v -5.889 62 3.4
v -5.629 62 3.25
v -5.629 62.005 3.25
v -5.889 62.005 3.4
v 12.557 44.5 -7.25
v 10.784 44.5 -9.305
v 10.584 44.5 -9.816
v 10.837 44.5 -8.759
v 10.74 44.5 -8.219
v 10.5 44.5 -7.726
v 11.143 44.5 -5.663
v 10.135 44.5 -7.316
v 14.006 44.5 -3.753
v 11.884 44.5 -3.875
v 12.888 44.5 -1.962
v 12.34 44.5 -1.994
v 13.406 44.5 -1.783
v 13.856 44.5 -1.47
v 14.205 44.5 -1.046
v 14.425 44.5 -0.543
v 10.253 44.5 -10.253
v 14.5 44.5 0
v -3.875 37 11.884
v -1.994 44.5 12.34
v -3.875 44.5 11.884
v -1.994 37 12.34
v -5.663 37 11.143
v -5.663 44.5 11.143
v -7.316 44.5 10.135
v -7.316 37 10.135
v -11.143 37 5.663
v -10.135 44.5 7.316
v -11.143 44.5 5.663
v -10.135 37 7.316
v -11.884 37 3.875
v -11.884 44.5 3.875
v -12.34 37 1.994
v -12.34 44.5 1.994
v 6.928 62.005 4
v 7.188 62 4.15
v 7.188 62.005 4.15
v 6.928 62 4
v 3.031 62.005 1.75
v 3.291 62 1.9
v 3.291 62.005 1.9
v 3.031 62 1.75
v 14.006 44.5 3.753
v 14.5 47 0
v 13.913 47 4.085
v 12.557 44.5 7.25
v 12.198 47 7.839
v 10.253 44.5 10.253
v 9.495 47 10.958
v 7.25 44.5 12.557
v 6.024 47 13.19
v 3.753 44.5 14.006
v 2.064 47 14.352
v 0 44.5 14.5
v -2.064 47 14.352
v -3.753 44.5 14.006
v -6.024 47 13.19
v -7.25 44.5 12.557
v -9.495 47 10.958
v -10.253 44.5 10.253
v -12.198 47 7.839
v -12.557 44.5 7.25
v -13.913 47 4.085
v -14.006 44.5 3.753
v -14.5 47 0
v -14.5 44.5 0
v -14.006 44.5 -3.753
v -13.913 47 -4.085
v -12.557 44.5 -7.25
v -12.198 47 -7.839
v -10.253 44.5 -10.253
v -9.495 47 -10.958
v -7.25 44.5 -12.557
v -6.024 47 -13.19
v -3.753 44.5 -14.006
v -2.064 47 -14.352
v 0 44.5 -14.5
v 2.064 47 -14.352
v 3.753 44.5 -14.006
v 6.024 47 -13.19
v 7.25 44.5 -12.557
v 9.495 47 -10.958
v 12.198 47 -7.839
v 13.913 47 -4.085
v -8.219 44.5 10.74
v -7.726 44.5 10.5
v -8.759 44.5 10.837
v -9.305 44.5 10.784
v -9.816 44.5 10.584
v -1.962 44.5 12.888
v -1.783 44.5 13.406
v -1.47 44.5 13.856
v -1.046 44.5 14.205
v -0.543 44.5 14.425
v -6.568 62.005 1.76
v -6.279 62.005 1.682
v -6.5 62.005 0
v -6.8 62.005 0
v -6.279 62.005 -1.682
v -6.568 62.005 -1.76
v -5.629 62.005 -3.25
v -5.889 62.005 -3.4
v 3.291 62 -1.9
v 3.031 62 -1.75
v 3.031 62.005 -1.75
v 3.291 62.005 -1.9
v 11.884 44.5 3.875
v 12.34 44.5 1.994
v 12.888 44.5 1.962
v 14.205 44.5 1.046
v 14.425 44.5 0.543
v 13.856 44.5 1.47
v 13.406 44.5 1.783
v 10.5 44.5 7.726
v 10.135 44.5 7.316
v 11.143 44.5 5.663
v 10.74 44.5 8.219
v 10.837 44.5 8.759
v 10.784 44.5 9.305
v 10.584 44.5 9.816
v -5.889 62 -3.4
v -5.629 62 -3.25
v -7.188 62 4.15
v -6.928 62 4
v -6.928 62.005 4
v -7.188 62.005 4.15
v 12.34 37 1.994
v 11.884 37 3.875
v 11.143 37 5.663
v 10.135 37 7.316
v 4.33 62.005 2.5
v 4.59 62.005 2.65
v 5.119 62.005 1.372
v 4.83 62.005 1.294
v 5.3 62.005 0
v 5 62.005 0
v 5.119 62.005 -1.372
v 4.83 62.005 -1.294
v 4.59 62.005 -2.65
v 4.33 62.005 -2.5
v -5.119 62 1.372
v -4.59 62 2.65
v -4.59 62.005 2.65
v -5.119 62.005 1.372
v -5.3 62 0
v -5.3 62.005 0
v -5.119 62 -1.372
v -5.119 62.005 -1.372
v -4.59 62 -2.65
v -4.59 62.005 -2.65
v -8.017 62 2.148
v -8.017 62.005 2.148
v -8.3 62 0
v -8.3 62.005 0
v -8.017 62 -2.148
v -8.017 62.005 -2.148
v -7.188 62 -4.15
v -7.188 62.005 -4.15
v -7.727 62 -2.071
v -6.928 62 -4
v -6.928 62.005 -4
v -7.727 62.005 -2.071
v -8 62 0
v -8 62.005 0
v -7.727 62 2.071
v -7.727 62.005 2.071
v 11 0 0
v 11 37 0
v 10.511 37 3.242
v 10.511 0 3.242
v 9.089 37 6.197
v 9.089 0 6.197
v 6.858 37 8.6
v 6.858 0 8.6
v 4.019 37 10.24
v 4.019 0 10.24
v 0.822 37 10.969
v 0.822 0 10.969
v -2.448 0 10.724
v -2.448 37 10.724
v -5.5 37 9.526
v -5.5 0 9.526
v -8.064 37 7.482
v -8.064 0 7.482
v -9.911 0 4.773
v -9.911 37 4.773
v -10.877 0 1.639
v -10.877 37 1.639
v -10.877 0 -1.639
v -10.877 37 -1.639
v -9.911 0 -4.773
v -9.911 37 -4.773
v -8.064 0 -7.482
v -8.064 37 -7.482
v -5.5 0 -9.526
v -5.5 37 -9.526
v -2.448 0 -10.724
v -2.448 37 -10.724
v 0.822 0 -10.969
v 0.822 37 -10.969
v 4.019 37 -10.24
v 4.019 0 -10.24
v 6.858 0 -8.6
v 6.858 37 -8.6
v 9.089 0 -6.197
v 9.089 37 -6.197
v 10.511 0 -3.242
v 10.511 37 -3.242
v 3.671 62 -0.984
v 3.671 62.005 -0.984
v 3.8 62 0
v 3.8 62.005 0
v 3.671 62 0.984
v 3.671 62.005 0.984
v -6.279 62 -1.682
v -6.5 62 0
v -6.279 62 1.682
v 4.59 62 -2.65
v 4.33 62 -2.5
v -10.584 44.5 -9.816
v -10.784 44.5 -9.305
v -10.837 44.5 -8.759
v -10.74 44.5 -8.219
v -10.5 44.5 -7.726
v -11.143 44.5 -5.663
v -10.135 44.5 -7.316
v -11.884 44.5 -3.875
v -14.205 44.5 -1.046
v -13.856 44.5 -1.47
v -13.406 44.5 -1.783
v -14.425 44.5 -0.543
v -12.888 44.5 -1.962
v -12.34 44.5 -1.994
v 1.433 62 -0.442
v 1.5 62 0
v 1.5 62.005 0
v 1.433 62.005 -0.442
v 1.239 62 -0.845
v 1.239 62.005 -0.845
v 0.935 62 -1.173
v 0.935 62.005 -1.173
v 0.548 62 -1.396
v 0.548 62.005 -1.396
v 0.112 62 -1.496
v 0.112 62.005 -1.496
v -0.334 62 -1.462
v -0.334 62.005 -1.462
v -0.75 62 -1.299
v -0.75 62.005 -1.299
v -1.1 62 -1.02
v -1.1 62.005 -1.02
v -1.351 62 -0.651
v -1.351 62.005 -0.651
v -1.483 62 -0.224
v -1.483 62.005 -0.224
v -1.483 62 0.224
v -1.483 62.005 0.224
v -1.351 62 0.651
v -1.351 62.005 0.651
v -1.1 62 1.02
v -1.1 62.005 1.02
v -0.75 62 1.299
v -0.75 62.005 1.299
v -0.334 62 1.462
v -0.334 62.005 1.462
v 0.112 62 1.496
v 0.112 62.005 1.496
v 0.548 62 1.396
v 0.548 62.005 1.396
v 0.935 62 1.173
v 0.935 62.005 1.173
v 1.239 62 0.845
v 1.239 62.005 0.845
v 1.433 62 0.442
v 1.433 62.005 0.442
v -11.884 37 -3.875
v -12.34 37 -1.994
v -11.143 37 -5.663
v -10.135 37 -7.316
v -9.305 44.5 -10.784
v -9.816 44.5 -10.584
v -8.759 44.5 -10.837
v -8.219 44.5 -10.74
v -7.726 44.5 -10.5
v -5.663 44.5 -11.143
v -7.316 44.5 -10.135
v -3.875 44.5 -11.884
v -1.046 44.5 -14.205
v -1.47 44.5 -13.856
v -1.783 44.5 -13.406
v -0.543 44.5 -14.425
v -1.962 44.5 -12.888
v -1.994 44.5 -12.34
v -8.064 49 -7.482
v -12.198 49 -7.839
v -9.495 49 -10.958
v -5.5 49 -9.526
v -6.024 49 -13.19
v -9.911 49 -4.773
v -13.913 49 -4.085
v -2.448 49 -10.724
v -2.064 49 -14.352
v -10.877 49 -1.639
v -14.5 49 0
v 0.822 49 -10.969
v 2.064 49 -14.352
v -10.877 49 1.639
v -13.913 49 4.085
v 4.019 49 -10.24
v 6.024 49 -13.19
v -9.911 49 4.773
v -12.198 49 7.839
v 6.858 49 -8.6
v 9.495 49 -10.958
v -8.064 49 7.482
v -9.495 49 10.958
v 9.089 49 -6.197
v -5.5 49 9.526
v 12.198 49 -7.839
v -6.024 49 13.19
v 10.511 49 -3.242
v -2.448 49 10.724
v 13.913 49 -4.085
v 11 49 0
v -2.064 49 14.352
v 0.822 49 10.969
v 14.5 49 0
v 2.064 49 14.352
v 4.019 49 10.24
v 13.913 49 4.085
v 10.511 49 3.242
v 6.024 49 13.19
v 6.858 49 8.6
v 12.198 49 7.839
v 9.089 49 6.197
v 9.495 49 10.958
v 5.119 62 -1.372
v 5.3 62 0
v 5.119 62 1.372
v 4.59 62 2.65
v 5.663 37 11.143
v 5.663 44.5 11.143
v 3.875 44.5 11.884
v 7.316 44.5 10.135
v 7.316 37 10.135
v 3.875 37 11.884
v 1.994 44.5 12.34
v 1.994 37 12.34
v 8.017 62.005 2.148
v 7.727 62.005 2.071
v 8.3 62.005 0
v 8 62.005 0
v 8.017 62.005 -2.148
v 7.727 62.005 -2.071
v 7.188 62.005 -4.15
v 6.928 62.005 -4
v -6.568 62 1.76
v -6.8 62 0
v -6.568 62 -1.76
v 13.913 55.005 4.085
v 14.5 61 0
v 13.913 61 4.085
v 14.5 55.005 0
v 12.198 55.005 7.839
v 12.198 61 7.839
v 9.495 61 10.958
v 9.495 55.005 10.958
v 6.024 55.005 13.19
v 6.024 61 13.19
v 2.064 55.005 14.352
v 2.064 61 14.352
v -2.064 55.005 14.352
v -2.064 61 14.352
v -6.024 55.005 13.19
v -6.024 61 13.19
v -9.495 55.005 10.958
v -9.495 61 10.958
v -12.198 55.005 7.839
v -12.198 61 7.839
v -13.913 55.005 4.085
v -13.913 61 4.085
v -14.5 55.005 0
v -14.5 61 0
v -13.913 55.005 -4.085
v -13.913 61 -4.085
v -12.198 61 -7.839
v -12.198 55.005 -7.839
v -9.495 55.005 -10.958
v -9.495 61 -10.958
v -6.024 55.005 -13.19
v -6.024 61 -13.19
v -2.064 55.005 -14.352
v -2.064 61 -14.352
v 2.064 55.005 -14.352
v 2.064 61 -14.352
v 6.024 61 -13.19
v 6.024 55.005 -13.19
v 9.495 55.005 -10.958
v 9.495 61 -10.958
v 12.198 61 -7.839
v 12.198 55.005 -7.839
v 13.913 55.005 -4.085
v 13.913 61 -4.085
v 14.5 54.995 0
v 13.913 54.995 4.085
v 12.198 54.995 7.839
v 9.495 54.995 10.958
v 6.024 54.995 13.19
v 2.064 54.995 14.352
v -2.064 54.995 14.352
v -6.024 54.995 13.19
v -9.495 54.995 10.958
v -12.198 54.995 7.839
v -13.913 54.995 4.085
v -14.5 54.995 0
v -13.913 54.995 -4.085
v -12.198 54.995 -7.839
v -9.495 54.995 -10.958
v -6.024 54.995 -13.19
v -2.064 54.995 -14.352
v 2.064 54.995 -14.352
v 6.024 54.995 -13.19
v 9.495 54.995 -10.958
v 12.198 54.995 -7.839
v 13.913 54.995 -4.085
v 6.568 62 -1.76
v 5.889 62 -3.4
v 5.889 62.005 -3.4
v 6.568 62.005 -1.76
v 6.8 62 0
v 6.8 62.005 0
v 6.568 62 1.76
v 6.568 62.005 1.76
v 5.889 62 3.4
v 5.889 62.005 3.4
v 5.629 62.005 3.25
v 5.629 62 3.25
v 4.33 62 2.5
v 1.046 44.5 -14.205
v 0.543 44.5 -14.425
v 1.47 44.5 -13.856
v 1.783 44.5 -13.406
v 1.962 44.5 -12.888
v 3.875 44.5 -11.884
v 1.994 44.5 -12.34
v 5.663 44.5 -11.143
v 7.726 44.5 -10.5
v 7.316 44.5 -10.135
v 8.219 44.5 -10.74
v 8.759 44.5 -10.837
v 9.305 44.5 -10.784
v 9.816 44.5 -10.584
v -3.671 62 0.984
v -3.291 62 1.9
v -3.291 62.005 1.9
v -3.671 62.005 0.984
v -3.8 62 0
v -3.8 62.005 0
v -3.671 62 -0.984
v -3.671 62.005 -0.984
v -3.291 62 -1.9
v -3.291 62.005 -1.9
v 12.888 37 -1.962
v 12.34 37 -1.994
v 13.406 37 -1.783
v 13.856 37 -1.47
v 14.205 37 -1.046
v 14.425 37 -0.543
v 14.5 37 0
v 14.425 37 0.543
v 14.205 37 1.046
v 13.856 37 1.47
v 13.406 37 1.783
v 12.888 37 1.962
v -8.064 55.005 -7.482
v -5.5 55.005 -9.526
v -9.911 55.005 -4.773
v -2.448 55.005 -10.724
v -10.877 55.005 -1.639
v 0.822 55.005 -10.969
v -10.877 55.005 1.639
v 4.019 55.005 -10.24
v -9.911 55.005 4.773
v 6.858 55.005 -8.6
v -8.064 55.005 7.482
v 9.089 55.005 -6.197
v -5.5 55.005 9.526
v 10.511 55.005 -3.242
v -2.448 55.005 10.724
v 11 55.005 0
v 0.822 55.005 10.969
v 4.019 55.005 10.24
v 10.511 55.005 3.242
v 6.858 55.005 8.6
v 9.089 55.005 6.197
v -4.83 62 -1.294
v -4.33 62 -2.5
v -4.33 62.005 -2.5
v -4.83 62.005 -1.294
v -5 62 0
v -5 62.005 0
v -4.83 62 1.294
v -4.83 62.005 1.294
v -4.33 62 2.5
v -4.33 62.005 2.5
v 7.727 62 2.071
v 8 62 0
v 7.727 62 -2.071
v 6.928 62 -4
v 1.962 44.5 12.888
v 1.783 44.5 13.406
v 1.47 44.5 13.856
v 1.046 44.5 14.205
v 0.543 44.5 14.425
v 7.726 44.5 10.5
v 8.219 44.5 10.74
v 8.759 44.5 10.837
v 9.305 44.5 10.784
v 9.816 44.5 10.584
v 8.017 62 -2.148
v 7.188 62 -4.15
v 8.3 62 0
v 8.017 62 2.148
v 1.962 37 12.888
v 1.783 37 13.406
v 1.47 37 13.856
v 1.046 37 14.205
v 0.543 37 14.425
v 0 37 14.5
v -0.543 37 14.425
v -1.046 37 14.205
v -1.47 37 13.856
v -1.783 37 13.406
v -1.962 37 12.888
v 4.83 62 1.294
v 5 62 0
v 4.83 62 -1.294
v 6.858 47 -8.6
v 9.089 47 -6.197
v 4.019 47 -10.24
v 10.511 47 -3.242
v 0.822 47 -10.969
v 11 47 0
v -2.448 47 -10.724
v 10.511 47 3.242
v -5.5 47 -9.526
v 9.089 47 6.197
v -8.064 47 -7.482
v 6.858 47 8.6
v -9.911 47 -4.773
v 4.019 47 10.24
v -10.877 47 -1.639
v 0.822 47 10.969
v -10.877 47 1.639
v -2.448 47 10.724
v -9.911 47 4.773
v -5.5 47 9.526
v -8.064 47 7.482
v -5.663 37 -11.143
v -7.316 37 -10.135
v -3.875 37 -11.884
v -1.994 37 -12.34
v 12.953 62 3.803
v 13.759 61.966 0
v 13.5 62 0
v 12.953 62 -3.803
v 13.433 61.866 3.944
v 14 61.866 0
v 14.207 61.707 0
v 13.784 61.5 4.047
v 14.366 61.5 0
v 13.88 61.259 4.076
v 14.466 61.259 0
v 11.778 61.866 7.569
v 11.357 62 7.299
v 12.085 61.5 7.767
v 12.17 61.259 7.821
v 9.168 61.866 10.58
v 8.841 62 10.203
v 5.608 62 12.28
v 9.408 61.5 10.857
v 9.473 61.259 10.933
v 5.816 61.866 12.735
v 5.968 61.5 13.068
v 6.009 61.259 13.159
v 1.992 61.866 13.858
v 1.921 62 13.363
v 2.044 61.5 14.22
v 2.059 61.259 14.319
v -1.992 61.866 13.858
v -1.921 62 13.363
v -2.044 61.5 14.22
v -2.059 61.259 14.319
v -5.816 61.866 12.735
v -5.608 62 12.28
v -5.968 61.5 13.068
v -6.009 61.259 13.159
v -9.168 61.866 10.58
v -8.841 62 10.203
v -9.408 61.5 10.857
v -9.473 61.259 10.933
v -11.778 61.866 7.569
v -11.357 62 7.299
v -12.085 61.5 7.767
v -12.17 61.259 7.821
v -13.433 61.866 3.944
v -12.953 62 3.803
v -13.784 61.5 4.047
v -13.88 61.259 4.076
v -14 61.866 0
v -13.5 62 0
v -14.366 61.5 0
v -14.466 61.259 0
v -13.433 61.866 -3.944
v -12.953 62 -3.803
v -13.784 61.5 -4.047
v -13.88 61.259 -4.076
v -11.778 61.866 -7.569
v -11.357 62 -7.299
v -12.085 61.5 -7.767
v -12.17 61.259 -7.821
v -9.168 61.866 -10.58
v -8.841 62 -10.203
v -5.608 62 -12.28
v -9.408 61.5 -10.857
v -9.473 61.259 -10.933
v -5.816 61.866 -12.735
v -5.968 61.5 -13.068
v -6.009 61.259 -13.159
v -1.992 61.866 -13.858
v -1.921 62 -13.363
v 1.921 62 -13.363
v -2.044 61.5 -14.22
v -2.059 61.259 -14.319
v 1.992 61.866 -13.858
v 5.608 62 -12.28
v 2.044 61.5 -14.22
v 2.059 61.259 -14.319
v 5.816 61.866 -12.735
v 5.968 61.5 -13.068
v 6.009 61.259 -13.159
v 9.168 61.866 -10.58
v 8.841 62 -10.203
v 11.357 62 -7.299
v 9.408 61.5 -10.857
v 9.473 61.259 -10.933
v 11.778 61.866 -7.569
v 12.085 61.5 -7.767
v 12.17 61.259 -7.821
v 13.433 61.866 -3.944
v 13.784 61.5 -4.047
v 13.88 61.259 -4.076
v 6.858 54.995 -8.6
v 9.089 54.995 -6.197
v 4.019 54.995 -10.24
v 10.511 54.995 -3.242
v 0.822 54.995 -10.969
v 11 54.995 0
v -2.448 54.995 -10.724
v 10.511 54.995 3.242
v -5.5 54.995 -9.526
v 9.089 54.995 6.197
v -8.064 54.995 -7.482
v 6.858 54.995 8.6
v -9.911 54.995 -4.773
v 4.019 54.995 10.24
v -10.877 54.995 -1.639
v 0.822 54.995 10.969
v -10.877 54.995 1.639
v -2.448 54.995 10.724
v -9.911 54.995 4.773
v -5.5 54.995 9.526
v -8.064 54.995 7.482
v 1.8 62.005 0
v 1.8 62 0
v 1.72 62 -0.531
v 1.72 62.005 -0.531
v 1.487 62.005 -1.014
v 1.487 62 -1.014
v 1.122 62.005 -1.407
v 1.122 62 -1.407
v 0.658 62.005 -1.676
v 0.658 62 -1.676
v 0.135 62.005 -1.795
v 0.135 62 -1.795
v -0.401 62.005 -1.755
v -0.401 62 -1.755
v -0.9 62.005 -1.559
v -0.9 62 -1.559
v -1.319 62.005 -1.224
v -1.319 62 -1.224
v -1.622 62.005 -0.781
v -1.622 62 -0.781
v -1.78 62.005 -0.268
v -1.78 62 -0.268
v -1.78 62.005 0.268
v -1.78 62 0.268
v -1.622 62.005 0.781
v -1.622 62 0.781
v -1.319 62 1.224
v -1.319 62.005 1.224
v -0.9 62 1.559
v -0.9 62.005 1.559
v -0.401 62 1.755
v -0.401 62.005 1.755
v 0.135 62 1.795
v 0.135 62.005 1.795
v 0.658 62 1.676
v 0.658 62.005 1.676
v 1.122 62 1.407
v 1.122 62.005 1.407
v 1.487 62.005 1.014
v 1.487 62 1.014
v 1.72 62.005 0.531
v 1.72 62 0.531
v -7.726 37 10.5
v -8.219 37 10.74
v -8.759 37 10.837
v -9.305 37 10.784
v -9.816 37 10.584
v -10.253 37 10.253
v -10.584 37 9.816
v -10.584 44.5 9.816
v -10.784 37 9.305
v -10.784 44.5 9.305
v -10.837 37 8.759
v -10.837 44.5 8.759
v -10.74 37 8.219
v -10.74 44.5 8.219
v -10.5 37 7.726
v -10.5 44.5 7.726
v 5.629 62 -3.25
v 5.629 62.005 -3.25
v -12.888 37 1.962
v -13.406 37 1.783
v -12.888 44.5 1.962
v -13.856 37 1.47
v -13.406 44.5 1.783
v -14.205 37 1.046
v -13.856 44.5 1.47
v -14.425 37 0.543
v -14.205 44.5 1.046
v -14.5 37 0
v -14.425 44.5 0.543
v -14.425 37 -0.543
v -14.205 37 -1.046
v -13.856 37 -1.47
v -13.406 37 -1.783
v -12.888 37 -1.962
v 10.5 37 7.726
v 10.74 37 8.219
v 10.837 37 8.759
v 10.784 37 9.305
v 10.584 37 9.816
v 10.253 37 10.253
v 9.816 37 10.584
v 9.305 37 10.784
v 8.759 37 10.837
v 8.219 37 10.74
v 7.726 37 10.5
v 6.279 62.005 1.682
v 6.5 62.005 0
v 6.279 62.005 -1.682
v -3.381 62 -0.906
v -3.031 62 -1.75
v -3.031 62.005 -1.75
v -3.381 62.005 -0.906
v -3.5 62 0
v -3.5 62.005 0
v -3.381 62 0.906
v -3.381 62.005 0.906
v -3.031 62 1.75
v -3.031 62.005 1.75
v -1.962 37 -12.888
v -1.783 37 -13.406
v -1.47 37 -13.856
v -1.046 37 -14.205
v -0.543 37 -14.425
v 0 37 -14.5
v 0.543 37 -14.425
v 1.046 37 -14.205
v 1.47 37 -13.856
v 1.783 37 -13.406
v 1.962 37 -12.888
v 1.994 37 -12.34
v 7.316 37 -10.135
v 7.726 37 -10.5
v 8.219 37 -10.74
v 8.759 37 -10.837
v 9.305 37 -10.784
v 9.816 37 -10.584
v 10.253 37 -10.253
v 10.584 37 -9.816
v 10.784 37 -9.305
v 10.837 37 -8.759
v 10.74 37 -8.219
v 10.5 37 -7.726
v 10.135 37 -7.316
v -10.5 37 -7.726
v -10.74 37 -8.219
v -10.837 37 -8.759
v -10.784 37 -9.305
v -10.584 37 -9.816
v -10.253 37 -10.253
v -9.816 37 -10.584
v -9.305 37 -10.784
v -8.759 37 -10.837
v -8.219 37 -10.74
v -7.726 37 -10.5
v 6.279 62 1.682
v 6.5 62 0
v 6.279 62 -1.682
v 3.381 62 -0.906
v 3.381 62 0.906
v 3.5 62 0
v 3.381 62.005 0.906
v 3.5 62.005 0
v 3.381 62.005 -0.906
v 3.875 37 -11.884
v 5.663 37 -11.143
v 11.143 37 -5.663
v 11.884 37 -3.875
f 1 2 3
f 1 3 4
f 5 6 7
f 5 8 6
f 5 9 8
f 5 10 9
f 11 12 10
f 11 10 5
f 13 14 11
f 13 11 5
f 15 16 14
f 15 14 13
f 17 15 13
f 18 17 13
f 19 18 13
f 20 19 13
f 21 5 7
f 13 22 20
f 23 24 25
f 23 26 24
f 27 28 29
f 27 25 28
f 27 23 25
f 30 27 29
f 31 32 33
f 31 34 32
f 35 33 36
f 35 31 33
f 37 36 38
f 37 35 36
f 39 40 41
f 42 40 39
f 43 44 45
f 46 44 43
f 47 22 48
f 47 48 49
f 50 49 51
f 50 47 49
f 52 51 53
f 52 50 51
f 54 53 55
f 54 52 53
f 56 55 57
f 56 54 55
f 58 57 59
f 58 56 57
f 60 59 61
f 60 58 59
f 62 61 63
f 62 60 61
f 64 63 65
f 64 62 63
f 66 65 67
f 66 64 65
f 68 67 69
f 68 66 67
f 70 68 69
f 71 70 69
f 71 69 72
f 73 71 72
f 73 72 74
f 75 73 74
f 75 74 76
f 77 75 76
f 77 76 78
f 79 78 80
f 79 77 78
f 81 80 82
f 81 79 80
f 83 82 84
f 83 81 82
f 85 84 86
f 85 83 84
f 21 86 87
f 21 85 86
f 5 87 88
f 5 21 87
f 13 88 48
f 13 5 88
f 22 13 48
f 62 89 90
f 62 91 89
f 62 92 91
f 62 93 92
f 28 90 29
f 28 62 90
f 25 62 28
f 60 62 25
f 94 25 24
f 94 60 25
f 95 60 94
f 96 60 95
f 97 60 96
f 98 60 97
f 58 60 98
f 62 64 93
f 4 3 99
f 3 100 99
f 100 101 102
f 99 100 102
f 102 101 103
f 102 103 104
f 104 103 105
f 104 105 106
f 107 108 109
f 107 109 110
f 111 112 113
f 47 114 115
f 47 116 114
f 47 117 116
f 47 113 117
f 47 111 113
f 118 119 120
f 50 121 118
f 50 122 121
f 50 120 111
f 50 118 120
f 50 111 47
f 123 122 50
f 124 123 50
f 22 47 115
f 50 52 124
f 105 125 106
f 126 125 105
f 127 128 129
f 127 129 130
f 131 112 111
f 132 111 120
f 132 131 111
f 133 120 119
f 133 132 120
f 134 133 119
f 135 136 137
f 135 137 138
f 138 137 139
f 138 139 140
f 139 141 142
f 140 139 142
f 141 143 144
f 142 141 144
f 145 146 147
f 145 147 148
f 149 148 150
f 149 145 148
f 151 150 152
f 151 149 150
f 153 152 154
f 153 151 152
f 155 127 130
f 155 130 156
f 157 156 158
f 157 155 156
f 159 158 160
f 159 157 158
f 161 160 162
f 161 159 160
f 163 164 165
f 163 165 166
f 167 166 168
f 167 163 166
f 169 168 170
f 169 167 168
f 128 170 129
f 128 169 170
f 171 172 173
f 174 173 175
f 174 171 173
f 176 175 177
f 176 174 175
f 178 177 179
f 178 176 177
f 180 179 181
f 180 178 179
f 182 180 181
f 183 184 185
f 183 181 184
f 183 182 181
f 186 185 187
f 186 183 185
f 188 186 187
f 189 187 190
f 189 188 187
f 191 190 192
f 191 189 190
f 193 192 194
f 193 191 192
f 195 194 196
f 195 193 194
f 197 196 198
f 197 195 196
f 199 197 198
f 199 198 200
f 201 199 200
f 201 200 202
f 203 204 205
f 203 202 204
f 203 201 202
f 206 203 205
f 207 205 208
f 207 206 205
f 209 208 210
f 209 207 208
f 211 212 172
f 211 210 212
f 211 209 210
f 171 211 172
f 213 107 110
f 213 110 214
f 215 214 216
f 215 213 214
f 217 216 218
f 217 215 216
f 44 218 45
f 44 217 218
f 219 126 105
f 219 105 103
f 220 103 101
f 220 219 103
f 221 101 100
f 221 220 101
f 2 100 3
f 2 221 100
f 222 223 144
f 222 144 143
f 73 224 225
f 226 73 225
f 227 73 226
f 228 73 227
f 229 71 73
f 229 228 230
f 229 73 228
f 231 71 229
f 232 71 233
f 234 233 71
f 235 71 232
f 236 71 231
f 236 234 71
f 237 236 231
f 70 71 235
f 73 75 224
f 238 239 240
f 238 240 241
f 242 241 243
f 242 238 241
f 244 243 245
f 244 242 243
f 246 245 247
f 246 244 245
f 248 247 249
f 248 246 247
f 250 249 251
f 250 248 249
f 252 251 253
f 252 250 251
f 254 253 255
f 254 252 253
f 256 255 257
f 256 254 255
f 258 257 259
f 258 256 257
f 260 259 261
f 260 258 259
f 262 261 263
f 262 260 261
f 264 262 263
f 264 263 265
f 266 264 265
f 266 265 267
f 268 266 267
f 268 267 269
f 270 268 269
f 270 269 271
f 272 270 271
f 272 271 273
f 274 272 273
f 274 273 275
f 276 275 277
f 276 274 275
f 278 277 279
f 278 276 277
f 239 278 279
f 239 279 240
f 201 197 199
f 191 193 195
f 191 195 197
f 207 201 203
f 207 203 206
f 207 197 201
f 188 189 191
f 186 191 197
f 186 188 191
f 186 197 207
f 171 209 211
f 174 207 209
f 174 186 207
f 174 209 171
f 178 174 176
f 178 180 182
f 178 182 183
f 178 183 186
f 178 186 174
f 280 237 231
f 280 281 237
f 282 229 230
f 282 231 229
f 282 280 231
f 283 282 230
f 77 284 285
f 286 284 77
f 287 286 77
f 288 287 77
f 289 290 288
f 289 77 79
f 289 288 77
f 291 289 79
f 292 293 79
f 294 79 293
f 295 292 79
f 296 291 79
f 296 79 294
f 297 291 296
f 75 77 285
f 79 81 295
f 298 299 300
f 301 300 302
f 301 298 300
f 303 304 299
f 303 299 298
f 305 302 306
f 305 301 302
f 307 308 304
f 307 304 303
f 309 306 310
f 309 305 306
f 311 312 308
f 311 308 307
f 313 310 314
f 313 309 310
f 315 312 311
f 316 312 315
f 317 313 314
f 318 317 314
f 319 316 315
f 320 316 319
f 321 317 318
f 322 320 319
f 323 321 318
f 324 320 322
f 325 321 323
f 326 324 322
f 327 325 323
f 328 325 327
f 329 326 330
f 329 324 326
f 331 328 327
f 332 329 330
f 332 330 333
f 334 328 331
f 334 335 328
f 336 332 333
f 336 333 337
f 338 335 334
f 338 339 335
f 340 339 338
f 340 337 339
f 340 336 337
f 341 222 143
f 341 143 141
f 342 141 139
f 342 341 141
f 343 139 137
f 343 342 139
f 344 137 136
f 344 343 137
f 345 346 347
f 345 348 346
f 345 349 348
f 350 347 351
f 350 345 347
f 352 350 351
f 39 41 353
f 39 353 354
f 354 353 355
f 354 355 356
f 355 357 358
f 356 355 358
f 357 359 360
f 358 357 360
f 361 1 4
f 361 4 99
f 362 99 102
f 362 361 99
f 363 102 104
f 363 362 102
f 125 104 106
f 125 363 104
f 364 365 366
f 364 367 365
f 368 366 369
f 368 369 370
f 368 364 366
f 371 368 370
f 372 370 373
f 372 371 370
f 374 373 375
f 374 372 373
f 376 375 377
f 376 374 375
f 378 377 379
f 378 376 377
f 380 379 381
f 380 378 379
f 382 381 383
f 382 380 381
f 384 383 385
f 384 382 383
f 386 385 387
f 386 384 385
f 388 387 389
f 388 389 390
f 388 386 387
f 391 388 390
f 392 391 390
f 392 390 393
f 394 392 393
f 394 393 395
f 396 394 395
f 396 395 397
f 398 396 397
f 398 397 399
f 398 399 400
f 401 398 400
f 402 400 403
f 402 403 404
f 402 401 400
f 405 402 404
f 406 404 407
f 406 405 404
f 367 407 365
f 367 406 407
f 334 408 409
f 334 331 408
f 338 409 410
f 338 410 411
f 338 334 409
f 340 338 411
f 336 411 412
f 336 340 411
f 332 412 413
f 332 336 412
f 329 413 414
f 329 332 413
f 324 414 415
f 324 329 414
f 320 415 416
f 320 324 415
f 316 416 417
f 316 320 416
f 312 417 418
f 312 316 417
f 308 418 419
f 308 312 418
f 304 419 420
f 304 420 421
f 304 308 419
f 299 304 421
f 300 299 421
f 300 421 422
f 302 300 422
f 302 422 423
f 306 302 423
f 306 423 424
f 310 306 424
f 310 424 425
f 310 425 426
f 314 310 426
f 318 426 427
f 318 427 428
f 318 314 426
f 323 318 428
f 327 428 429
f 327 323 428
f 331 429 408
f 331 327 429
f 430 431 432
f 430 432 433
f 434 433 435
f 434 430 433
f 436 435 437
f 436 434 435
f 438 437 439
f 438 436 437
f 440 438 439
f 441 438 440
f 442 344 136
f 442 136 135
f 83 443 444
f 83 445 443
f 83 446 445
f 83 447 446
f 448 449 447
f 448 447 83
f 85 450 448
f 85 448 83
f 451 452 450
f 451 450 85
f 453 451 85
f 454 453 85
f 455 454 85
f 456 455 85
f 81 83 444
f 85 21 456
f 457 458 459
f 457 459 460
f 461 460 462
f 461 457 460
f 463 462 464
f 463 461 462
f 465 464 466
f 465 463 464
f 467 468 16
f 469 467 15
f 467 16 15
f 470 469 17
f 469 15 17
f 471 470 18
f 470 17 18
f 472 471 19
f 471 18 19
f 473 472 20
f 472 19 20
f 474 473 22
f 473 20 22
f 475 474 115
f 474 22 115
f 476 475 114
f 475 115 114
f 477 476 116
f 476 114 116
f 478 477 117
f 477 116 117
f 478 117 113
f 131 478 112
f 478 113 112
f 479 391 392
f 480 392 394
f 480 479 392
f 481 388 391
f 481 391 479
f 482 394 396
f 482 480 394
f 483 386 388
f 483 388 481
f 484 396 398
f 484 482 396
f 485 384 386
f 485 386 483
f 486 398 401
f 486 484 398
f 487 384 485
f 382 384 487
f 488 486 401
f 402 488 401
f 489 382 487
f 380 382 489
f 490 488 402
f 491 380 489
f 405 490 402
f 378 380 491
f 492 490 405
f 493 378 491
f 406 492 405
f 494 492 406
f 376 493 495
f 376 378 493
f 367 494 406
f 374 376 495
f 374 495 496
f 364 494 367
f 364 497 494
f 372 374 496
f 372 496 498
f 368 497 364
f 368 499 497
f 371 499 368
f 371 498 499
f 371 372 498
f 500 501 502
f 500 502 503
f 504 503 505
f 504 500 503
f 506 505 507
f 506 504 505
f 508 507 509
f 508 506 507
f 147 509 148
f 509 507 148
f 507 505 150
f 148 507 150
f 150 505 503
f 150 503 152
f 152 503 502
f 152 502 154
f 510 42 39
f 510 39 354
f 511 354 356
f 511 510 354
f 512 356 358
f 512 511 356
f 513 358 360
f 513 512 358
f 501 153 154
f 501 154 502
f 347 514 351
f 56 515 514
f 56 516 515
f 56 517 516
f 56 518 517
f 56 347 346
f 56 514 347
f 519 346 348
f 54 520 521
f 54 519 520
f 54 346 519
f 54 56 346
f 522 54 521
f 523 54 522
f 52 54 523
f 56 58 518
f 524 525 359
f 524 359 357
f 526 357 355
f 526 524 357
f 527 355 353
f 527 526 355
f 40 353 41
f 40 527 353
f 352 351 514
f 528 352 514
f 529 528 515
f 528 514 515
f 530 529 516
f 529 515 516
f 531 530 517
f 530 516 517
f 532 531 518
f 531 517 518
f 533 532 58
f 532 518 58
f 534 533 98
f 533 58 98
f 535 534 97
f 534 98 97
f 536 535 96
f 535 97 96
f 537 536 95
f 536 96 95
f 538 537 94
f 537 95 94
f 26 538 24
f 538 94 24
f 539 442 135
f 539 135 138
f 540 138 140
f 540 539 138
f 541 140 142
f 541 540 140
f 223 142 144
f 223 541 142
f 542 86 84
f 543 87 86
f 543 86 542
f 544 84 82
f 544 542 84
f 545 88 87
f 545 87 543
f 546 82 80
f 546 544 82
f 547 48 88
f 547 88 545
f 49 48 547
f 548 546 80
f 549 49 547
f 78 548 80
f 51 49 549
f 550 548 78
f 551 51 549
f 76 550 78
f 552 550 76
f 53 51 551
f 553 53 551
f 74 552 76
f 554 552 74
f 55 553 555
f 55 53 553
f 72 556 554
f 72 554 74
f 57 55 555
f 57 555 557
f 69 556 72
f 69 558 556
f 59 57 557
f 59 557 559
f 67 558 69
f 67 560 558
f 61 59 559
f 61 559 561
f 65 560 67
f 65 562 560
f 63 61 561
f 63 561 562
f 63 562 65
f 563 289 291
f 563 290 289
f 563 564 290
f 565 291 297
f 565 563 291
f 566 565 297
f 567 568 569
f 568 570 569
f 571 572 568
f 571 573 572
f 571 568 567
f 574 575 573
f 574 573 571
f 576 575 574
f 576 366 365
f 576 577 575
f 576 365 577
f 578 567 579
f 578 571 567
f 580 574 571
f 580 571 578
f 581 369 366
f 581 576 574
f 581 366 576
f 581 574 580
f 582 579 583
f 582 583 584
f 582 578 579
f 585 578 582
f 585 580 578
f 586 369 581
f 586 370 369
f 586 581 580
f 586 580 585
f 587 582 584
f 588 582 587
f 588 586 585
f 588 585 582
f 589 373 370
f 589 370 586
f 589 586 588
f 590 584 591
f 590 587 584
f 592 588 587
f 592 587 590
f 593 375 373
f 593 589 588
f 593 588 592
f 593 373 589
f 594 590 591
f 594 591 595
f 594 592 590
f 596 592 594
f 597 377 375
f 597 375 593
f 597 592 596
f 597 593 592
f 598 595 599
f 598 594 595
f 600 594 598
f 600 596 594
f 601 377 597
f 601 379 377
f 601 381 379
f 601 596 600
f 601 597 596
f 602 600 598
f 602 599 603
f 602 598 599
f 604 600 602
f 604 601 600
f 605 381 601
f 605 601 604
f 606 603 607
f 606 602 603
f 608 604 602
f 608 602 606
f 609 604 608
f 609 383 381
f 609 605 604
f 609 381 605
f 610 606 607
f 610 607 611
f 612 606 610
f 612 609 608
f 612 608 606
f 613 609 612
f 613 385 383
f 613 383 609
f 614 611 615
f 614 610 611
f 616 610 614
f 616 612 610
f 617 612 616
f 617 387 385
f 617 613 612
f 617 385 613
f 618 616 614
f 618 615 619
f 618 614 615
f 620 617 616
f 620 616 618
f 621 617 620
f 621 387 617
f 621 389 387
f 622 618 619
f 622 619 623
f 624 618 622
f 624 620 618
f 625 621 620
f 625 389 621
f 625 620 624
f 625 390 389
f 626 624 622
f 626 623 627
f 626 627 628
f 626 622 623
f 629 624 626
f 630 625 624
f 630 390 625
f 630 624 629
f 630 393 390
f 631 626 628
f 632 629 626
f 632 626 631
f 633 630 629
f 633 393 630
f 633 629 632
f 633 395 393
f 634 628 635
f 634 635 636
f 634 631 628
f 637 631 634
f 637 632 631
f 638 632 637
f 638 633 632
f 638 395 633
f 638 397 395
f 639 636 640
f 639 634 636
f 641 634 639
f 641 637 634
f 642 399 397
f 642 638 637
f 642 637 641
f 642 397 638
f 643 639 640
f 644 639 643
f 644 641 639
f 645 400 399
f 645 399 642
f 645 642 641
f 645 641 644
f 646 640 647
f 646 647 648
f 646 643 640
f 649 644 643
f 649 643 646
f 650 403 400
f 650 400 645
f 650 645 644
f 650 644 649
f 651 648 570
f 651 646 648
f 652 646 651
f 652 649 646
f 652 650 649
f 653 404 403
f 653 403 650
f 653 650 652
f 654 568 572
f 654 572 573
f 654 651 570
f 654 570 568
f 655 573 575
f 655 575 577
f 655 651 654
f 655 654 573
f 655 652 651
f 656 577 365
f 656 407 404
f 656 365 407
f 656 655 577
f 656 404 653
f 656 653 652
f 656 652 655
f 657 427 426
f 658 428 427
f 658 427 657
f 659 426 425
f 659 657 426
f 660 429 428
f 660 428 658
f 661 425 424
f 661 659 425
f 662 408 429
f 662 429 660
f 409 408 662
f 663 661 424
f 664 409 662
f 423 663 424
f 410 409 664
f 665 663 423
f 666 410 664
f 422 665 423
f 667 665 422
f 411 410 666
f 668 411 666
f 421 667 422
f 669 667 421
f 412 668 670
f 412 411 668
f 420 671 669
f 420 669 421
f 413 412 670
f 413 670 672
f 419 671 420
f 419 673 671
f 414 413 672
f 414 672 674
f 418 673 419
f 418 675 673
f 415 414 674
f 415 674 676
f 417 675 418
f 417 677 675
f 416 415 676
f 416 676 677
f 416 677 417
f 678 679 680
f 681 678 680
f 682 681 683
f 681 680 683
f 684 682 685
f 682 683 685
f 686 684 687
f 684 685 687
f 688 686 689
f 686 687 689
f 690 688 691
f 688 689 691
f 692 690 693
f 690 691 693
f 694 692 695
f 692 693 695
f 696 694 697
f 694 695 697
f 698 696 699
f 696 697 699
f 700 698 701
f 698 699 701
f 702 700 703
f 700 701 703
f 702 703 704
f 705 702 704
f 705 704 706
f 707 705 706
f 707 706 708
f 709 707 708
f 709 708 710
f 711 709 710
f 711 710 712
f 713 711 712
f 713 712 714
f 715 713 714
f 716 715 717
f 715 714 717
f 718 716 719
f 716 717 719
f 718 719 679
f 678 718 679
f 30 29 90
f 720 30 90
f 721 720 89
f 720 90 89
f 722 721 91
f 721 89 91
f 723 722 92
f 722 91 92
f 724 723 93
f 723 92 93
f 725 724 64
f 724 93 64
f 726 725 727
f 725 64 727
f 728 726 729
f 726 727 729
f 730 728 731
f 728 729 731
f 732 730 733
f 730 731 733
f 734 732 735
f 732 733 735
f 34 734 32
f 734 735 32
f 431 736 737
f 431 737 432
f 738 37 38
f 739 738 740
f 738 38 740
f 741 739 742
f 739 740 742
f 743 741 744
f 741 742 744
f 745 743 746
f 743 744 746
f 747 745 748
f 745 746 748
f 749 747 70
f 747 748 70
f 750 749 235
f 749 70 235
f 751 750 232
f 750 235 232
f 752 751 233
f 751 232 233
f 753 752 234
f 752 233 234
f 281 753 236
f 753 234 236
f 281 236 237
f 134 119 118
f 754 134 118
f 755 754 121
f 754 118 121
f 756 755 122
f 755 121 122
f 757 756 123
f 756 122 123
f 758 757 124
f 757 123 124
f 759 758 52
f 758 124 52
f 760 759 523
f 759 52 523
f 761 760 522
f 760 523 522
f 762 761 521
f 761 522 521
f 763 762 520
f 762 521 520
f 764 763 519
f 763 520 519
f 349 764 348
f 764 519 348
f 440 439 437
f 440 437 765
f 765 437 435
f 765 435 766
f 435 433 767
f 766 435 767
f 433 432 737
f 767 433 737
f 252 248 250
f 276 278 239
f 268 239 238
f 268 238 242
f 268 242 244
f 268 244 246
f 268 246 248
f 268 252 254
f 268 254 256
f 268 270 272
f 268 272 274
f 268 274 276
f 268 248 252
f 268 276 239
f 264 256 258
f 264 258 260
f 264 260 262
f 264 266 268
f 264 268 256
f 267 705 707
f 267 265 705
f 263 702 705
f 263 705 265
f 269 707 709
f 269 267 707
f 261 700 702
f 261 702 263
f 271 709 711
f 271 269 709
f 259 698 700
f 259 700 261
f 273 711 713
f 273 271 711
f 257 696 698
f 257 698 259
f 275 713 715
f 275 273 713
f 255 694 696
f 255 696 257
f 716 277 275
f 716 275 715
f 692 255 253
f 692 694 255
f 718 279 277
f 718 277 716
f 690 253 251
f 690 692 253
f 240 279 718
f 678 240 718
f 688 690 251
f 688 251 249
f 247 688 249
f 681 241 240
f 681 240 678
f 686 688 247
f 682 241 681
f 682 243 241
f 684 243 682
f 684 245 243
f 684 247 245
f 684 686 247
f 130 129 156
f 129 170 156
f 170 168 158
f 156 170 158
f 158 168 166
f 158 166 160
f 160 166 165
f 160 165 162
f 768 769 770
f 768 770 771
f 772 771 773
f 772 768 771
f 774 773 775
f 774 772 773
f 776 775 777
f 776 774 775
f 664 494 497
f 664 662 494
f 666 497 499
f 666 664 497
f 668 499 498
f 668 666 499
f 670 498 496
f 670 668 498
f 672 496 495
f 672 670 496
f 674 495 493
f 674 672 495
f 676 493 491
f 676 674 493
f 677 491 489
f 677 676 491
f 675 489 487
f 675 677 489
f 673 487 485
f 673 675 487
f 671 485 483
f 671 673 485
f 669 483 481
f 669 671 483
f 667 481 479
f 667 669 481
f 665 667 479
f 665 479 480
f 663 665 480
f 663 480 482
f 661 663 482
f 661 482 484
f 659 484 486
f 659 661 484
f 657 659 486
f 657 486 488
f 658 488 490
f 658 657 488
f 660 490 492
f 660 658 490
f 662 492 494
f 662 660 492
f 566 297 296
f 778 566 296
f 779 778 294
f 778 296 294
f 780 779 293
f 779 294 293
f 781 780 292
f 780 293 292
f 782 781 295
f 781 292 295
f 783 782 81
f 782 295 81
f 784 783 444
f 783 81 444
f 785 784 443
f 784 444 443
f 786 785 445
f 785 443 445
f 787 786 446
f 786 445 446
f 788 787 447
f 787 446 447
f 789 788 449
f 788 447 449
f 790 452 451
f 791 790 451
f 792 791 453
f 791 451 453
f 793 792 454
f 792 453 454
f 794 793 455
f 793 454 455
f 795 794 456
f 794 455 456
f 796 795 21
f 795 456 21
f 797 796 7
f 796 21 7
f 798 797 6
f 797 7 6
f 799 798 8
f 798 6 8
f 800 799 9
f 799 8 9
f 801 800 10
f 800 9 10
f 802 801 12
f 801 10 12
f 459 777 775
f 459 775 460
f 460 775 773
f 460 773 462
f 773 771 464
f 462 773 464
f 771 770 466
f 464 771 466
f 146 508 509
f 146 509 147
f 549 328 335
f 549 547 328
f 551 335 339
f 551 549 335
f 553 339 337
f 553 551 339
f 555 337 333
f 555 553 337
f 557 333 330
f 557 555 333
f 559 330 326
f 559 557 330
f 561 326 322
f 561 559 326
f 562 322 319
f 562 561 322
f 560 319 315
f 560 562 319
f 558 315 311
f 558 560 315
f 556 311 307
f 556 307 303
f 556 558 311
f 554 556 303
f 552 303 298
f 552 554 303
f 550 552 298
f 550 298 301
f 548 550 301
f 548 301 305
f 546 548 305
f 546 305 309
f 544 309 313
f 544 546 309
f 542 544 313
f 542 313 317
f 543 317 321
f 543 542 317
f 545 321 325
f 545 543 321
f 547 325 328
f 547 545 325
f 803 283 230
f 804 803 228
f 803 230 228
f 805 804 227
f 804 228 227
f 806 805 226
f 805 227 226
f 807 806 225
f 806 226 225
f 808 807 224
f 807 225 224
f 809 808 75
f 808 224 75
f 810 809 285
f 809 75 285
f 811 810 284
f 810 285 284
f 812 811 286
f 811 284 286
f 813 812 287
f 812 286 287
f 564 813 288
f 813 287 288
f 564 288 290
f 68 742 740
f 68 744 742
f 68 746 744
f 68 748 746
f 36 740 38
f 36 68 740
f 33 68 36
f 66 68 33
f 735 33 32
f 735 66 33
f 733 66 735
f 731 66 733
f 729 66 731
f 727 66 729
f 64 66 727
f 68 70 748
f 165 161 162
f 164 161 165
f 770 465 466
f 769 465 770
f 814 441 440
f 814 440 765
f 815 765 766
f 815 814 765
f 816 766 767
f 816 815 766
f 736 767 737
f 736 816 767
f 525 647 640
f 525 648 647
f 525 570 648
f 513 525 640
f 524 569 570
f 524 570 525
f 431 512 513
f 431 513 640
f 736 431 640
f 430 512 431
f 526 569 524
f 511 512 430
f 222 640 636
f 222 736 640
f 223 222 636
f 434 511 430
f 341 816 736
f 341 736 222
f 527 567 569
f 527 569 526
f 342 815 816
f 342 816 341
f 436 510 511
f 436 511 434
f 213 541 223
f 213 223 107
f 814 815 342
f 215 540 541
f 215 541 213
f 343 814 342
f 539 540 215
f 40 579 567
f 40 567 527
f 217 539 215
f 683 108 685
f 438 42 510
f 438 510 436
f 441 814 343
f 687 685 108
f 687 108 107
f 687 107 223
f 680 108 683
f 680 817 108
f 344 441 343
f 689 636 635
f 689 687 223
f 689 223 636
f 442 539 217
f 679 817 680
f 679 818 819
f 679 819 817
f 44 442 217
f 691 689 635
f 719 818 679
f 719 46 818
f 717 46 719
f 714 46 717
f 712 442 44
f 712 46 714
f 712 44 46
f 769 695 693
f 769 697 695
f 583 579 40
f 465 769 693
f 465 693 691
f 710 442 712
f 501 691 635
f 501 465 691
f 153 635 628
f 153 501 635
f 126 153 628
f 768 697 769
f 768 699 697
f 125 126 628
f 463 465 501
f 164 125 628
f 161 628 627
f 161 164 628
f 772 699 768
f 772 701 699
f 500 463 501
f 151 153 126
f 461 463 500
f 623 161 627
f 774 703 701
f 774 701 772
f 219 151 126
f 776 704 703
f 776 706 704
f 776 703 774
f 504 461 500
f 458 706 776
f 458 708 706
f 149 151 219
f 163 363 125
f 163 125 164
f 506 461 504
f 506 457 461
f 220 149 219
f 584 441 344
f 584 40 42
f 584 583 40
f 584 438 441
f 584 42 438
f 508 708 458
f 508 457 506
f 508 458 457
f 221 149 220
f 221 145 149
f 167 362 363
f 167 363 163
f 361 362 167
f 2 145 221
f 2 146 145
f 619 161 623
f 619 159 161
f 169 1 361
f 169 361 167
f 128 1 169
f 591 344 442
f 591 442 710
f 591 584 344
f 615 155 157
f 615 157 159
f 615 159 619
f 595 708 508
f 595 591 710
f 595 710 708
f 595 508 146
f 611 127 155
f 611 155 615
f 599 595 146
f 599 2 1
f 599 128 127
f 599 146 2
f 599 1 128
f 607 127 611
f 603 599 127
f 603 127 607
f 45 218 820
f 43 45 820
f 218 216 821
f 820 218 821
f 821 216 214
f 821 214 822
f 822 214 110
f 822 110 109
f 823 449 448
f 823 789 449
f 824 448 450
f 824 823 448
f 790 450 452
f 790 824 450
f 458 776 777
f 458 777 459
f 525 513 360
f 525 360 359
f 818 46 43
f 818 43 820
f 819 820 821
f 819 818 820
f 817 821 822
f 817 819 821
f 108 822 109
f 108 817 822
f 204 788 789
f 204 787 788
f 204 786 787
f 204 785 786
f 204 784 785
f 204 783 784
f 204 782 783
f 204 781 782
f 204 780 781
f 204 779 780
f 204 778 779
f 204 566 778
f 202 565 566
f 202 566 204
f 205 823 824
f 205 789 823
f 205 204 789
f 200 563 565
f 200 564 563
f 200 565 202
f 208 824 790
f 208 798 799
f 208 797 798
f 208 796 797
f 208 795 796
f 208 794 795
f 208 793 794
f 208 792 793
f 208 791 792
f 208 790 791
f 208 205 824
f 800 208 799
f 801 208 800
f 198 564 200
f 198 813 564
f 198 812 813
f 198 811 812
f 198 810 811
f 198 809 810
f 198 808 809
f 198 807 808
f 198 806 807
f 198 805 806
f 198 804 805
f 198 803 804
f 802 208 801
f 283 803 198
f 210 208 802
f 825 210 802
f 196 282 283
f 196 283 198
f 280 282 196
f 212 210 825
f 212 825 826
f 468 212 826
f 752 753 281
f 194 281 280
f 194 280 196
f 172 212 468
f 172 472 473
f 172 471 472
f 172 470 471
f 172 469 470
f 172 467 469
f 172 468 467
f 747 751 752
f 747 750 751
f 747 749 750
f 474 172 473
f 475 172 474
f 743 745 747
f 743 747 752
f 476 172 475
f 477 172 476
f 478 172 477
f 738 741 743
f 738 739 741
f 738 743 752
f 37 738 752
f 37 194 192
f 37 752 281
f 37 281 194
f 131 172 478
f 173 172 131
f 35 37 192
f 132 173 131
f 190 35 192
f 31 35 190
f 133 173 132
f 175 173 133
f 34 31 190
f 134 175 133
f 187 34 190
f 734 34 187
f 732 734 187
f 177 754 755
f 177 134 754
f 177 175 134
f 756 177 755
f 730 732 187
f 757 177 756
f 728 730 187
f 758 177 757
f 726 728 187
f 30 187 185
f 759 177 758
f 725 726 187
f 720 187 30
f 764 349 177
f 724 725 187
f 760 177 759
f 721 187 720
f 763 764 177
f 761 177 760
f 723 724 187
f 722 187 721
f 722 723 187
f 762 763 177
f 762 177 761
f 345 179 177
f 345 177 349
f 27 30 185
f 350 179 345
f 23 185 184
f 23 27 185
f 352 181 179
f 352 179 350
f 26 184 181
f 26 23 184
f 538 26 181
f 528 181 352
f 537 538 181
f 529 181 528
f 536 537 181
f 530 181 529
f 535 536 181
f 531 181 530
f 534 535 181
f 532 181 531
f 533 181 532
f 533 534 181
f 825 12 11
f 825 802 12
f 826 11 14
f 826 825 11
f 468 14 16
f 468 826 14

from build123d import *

# Parameters (mm, degrees)
SKETCH2_R           = 2
BOSS_EXTRUDE1_DEPTH = 7.5
CIRPATTERN1_COUNT   = 8
SKETCH3_R           = 1.8
SKETCH3_R_2         = 1.5
BOSS_EXTRUDE2_DEPTH = 0.005


with BuildPart() as part:
    # Sketch1 → Revolve1 (revolve)
    with BuildSketch(Plane.XY):
        with BuildLine():
            Line((0, 0), (0, 62))
            Line((0, 62), (13.5, 62))
            ThreePointArc((13.5, 62), (14.207106781, 61.707106781), (14.5, 61))
            Line((14.5, 61), (14.5, 55.005))
            Line((14.5, 55.005), (11, 55.005))
            Line((11, 55.005), (11, 54.995))
            Line((11, 54.995), (14.5, 54.995))
            Line((14.5, 54.995), (14.5, 49))
            Line((14.5, 49), (11, 49))
            Line((11, 49), (11, 47))
            Line((11, 47), (14.5, 47))
            Line((14.5, 47), (14.5, 44.5))
            Line((14.5, 44.5), (12.5, 44.5))
            Line((12.5, 44.5), (12.5, 37))
            Line((12.5, 37), (11, 37))
            Line((11, 37), (11, 0))
            Line((11, 0), (0, 0))
        make_face()
    revolve(axis=Axis((0, 0, 0), (0, -1, 0)))

    # Sketch2 → Boss-Extrude1 (add)
    with BuildSketch(Plane.XZ.offset(-44.5)):
        with Locations((0, 12.5)):
            Circle(SKETCH2_R)
    boss_extrude1 = extrude(amount=BOSS_EXTRUDE1_DEPTH)

    # CirPattern1: Boss-Extrude1 ×8 about axis
    cirpattern1_axis = Axis((0, 0, 0), (0, 1, 0))
    for i in range(1, CIRPATTERN1_COUNT):
        add(boss_extrude1.rotate(cirpattern1_axis, i * 360 / CIRPATTERN1_COUNT))

    # Sketch3 → Boss-Extrude2 (add)
    with BuildSketch(Plane(origin=(0, 62, 0), x_dir=(1, 0, 0), z_dir=(0, 1, 0))):
        Circle(SKETCH3_R)
        Circle(SKETCH3_R_2, mode=Mode.SUBTRACT)
        with BuildLine():
            Line((-4.330127019, -2.5), (-4.58993464, -2.65))
            ThreePointArc((-4.58993464, -2.65), (-5.3, 0), (-4.58993464, 2.65))
            Line((-4.58993464, 2.65), (-4.330127019, 2.5))
            ThreePointArc((-4.330127019, 2.5), (-5, 0), (-4.330127019, -2.5))
        make_face()
        with BuildLine():
            Line((-3.031088913, -1.75), (-3.290896534, -1.9))
            ThreePointArc((-3.290896534, -1.9), (-3.8, 0), (-3.290896534, 1.9))
            Line((-3.290896534, 1.9), (-3.031088913, 1.75))
            ThreePointArc((-3.031088913, 1.75), (-3.5, 0), (-3.031088913, -1.75))
        make_face()
        with BuildLine():
            Line((-5.629165125, -3.25), (-5.888972746, -3.4))
            ThreePointArc((-5.888972746, -3.4), (-6.8, 0), (-5.888972746, 3.4))
            Line((-5.888972746, 3.4), (-5.629165125, 3.25))
            ThreePointArc((-5.629165125, 3.25), (-6.5, 0), (-5.629165125, -3.25))
        make_face()
        with BuildLine():
            Line((-6.92820323, -4), (-7.188010851, -4.15))
            ThreePointArc((-7.188010851, -4.15), (-8.3, 0), (-7.188010851, 4.15))
            Line((-7.188010851, 4.15), (-6.92820323, 4))
            ThreePointArc((-6.92820323, 4), (-8, 0), (-6.92820323, -4))
        make_face()
        with BuildLine():
            Line((6.92820323, 4), (7.188010851, 4.15))
            ThreePointArc((7.188010851, 4.15), (8.3, 0), (7.188010851, -4.15))
            Line((7.188010851, -4.15), (6.92820323, -4))
            ThreePointArc((6.92820323, -4), (8, 0), (6.92820323, 4))
        make_face()
        with BuildLine():
            Line((5.629165125, 3.25), (5.888972746, 3.4))
            ThreePointArc((5.888972746, 3.4), (6.8, 0), (5.888972746, -3.4))
            Line((5.888972746, -3.4), (5.629165125, -3.25))
            ThreePointArc((5.629165125, -3.25), (6.5, 0), (5.629165125, 3.25))
        make_face()
        with BuildLine():
            Line((4.330127019, 2.5), (4.58993464, 2.65))
            ThreePointArc((4.58993464, 2.65), (5.3, 0), (4.58993464, -2.65))
            Line((4.58993464, -2.65), (4.330127019, -2.5))
            ThreePointArc((4.330127019, -2.5), (5, 0), (4.330127019, 2.5))
        make_face()
        with BuildLine():
            Line((3.031088913, 1.75), (3.290896534, 1.9))
            ThreePointArc((3.290896534, 1.9), (3.8, 0), (3.290896534, -1.9))
            Line((3.290896534, -1.9), (3.031088913, -1.75))
            ThreePointArc((3.031088913, -1.75), (3.5, 0), (3.031088913, 1.75))
        make_face()
    extrude(amount=BOSS_EXTRUDE2_DEPTH)


solid = part.part
